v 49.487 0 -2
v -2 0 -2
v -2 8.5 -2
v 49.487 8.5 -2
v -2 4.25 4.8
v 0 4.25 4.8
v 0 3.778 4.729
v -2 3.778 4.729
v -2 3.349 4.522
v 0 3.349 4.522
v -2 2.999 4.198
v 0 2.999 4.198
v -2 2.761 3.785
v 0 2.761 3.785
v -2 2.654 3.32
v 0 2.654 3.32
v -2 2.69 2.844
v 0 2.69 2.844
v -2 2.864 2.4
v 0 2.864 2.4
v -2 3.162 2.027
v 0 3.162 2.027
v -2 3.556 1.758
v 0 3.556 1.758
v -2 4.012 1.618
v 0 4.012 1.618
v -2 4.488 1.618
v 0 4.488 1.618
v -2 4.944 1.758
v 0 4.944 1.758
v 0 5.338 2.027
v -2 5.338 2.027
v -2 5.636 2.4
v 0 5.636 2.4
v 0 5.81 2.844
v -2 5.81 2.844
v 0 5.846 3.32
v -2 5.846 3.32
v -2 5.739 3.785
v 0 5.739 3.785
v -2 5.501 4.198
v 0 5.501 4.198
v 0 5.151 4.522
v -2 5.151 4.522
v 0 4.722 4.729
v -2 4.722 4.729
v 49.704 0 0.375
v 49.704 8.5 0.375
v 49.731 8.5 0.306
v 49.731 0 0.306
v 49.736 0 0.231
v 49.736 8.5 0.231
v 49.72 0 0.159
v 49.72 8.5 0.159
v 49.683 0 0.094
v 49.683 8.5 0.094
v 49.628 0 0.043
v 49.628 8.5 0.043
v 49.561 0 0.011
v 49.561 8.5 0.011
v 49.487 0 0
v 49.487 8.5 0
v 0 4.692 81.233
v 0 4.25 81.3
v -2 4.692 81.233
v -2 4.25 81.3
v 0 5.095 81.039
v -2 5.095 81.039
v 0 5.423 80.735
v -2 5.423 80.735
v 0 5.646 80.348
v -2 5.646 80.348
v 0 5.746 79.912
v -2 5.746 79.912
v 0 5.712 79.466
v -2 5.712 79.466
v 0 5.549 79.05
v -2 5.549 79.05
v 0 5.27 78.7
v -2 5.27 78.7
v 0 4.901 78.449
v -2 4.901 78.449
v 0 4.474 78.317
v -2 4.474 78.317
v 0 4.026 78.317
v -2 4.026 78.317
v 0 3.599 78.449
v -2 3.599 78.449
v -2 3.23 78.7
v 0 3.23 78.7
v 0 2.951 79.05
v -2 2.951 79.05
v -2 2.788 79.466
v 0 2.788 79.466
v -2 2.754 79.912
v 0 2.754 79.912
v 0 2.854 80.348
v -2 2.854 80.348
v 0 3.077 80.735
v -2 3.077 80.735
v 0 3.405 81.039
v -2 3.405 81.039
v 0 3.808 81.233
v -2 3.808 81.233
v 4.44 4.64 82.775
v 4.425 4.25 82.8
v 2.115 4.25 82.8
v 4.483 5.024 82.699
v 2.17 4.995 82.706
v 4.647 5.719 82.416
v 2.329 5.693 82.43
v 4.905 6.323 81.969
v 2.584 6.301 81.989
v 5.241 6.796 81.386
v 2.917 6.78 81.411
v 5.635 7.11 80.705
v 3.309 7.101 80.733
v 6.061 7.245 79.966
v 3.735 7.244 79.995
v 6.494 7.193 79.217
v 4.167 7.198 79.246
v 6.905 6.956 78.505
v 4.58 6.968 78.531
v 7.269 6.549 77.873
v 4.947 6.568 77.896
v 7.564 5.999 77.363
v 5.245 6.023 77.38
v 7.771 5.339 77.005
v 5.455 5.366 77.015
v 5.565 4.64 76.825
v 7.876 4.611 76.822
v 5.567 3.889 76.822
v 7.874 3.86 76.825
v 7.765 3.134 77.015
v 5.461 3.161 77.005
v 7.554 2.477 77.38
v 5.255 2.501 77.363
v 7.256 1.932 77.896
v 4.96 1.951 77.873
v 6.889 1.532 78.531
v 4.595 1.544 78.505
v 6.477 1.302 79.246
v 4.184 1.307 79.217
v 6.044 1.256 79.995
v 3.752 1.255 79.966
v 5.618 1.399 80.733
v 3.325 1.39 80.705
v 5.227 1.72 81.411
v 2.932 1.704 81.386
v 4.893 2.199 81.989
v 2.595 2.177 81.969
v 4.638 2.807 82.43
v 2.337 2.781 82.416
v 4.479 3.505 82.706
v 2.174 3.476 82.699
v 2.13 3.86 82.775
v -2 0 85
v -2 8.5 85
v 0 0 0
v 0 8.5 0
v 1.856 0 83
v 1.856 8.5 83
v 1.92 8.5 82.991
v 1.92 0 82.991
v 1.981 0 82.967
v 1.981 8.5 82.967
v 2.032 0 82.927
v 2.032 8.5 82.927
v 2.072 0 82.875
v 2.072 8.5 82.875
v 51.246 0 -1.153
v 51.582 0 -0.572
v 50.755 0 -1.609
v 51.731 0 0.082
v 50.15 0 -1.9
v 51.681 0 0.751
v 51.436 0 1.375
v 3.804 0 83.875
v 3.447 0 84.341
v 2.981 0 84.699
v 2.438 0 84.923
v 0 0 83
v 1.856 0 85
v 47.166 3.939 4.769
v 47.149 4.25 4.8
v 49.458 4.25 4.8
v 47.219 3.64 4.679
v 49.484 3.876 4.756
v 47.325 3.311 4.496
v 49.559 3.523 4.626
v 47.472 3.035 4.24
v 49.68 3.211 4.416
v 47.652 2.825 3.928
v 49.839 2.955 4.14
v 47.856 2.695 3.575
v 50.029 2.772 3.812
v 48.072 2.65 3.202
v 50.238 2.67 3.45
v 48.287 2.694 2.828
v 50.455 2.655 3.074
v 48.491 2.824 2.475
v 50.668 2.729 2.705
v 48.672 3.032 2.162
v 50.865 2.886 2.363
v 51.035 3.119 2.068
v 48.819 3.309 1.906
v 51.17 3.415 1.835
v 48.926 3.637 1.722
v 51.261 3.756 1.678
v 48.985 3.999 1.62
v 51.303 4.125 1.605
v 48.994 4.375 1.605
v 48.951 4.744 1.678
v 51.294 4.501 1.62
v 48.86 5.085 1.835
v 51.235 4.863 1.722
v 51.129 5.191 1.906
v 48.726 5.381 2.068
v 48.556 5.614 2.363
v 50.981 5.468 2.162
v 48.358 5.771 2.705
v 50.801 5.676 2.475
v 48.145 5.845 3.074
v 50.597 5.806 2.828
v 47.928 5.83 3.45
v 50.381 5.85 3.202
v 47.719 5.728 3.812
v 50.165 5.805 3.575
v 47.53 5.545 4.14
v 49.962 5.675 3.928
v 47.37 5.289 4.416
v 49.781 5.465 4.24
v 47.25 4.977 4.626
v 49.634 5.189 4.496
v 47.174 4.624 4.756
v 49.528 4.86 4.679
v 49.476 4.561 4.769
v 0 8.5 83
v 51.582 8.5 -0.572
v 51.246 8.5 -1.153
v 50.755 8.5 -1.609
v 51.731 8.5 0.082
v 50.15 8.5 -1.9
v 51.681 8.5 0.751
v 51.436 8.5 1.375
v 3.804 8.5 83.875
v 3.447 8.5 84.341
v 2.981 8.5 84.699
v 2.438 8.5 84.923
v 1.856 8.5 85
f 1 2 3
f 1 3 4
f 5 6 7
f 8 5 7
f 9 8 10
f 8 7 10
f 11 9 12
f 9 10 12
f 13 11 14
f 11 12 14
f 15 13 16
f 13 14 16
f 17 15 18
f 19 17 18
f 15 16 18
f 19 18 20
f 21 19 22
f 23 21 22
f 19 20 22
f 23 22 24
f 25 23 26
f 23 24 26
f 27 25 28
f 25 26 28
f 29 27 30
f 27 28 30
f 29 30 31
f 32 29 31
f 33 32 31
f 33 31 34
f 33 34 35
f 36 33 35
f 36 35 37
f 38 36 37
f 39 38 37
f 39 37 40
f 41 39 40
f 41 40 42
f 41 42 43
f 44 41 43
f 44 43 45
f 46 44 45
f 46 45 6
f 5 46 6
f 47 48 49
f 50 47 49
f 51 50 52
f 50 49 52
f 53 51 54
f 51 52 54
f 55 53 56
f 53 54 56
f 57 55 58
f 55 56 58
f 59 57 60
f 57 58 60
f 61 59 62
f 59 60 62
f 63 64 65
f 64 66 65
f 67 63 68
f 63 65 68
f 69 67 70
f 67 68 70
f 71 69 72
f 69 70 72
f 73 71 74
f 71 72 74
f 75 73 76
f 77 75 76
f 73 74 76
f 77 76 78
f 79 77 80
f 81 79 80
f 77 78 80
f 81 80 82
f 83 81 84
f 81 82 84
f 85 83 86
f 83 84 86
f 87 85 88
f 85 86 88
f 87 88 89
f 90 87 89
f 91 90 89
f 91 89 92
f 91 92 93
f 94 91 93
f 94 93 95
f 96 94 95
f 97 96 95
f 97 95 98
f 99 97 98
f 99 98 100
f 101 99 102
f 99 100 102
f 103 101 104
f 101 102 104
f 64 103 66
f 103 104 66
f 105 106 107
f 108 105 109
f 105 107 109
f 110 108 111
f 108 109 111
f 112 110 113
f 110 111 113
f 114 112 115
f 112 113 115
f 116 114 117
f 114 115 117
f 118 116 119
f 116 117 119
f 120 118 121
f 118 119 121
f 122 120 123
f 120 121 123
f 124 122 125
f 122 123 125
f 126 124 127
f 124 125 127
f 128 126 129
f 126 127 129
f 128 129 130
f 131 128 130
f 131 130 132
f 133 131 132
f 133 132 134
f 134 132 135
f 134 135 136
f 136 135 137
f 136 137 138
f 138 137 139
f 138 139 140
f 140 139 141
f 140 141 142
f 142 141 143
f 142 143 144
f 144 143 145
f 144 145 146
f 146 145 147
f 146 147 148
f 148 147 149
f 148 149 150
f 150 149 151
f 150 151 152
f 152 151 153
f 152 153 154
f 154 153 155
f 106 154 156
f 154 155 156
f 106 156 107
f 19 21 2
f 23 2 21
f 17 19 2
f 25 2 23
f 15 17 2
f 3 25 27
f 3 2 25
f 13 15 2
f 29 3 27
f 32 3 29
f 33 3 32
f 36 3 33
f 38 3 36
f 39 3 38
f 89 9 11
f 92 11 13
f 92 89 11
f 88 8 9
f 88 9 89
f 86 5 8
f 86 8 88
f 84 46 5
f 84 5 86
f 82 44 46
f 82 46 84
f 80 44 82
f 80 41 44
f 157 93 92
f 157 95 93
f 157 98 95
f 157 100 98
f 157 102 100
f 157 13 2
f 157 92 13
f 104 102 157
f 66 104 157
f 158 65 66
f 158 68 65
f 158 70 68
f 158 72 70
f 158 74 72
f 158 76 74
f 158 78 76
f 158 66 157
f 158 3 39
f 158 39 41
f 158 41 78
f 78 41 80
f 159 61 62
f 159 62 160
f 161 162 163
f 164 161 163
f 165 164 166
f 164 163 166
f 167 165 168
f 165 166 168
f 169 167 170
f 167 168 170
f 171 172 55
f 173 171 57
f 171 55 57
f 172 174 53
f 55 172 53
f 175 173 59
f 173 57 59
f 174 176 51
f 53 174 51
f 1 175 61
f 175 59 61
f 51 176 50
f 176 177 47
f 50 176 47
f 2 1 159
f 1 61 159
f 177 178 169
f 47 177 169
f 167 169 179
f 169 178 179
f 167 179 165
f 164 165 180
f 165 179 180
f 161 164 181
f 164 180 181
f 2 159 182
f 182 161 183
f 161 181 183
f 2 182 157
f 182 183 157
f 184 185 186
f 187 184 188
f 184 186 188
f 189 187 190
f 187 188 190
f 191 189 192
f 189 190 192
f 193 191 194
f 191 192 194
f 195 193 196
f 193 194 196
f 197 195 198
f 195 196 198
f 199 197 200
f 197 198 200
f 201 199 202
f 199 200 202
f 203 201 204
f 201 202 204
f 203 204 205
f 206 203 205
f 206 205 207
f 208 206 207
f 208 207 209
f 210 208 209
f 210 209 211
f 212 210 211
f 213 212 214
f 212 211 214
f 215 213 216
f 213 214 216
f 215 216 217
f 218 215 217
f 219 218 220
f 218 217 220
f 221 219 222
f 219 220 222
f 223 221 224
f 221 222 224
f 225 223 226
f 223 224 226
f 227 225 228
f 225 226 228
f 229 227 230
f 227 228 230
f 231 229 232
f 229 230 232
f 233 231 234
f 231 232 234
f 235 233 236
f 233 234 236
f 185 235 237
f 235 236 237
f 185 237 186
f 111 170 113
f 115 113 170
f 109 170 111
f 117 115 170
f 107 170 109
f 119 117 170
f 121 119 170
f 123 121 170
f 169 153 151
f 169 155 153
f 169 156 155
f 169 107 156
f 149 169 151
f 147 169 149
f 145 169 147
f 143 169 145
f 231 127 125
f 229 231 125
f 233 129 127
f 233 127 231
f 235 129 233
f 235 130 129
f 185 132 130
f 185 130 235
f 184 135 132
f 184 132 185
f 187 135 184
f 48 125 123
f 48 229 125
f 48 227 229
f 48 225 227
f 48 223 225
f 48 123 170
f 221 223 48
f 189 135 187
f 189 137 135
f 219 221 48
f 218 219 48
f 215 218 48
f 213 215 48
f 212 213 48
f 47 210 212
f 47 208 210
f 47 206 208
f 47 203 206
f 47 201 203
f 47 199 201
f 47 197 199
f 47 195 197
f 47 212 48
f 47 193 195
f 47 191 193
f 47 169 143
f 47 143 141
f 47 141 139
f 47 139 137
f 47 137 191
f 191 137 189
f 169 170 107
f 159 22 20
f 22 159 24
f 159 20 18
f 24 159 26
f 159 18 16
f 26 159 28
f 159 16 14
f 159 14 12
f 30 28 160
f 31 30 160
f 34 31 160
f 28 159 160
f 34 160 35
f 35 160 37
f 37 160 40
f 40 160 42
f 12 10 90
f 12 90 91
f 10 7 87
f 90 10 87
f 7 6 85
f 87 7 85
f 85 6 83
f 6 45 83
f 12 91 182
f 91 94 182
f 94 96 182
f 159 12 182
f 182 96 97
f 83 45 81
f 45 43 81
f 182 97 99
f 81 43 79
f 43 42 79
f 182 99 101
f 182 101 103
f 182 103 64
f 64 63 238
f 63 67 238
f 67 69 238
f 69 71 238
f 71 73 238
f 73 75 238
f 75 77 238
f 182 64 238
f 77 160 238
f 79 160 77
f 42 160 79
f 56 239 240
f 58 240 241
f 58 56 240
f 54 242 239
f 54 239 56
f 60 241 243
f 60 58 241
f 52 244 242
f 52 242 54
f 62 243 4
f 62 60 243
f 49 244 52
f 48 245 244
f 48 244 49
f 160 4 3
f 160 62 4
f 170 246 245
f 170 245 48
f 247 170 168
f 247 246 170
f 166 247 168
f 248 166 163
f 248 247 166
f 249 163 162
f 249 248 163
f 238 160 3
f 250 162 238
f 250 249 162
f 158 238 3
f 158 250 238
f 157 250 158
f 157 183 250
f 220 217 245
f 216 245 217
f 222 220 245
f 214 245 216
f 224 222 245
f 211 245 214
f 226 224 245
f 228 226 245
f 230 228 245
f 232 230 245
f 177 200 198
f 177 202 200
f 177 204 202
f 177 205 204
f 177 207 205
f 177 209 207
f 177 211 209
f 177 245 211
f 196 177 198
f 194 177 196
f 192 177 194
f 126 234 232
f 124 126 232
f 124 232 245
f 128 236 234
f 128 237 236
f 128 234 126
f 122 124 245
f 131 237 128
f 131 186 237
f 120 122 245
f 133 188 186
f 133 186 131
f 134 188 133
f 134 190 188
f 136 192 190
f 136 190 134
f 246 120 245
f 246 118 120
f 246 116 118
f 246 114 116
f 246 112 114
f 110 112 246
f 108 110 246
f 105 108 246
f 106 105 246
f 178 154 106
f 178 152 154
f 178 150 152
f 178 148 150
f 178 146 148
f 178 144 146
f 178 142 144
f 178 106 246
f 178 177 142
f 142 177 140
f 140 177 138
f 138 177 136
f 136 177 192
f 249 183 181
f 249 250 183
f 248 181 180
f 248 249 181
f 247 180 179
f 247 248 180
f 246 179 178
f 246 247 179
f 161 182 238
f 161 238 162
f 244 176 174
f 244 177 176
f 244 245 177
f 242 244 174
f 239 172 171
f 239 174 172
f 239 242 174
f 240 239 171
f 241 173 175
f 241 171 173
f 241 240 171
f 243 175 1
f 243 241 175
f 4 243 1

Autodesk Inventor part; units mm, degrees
ref_plane "YZ Plane" through (0, 0, 0) normal (1, 0, 0) x (0, 1, 0)
ref_plane "XZ Plane" through (0, 0, 0) normal (0, 1, 0) x (-1, 0, 0)
ref_plane "XY Plane" through (0, 0, 0) normal (0, 0, 1) x (1, 0, 0)
sketch "Náčrt1" plane through (0, 0, 0) normal (0, 1, 0) x (-1, 0, 0)
  line L0 (0, 0) -> (0, 83)
  line L1 (0, 83) -> (-2, 83)
  line L2 (-2, 83) -> (-49.9201, 0)
  line L3 (-49.9201, 0) -> (0, 0)
  line L4 (2, 85) -> (2, -2)
  line L5 (2, -2) -> (-53.3842, -2)
  line L6 (-53.3842, -2) -> (-3.1547, 85)
  line L7 (-3.1547, 85) -> (2, 85)
  dimension "d0" = 30
  dimension "d1" = 2
  dimension "d2" = 83
  dimension "d3" = 49.9201
  dimension "d4" = 2
extrude "Vysunutí1" add sketch "Náčrt1" along normal blind 8.5
sketch "Náčrt2" plane through (-2, 0, -2) normal (-1, 0, 0) x (0, 0, 1)
  line L0 (0, 0) -> (87, 0) projected
  line L1 (87, 0) -> (87, 8.5) projected
  line L2 (0, 8.5) -> (87, 8.5) projected
  line L3 (0, 0) -> (0, 8.5) projected
  line L4 (0, 4.25) -> (87, 4.25) construction
  circle A0 centre (5.2, 4.25) radius 1.5
  circle A1 centre (81.8, 4.25) radius 1.5
  line L5 (43.5, 8.5) -> (43.5, 0) construction
  circle A2 centre (5.2, 4.25) radius 3
  circle A3 centre (81.8, 4.25) radius 3
  point P0 (2, 0)
  dimension "d10" = 3
  dimension "d11" = 38.3
  dimension "d12" = 76.6
  dimension "d13" = 6
hole "Díra1" at (-2, 4.25, 79.8) at (-2, 4.25, 3.2) direction (1, 0, 0) diameter 3.2 end through all
extrude "Vysunutí2" cut sketch "Náčrt2" against normal blind 11.25 contours A3
extrude "Vysunutí3" add sketch "Náčrt2" against normal up to surface (2 mm away) contours A3
fillet "Zaoblení1" radius 2.25 2 edges at (53.3842, 4.25, -2) (3.1547, 4.25, 85)
fillet "Zaoblení1" radius 0.25 2 edges at (49.9201, 4.25, 0) (2, 4.25, 83)
properties part number "FL-LapTimer-Foot"
